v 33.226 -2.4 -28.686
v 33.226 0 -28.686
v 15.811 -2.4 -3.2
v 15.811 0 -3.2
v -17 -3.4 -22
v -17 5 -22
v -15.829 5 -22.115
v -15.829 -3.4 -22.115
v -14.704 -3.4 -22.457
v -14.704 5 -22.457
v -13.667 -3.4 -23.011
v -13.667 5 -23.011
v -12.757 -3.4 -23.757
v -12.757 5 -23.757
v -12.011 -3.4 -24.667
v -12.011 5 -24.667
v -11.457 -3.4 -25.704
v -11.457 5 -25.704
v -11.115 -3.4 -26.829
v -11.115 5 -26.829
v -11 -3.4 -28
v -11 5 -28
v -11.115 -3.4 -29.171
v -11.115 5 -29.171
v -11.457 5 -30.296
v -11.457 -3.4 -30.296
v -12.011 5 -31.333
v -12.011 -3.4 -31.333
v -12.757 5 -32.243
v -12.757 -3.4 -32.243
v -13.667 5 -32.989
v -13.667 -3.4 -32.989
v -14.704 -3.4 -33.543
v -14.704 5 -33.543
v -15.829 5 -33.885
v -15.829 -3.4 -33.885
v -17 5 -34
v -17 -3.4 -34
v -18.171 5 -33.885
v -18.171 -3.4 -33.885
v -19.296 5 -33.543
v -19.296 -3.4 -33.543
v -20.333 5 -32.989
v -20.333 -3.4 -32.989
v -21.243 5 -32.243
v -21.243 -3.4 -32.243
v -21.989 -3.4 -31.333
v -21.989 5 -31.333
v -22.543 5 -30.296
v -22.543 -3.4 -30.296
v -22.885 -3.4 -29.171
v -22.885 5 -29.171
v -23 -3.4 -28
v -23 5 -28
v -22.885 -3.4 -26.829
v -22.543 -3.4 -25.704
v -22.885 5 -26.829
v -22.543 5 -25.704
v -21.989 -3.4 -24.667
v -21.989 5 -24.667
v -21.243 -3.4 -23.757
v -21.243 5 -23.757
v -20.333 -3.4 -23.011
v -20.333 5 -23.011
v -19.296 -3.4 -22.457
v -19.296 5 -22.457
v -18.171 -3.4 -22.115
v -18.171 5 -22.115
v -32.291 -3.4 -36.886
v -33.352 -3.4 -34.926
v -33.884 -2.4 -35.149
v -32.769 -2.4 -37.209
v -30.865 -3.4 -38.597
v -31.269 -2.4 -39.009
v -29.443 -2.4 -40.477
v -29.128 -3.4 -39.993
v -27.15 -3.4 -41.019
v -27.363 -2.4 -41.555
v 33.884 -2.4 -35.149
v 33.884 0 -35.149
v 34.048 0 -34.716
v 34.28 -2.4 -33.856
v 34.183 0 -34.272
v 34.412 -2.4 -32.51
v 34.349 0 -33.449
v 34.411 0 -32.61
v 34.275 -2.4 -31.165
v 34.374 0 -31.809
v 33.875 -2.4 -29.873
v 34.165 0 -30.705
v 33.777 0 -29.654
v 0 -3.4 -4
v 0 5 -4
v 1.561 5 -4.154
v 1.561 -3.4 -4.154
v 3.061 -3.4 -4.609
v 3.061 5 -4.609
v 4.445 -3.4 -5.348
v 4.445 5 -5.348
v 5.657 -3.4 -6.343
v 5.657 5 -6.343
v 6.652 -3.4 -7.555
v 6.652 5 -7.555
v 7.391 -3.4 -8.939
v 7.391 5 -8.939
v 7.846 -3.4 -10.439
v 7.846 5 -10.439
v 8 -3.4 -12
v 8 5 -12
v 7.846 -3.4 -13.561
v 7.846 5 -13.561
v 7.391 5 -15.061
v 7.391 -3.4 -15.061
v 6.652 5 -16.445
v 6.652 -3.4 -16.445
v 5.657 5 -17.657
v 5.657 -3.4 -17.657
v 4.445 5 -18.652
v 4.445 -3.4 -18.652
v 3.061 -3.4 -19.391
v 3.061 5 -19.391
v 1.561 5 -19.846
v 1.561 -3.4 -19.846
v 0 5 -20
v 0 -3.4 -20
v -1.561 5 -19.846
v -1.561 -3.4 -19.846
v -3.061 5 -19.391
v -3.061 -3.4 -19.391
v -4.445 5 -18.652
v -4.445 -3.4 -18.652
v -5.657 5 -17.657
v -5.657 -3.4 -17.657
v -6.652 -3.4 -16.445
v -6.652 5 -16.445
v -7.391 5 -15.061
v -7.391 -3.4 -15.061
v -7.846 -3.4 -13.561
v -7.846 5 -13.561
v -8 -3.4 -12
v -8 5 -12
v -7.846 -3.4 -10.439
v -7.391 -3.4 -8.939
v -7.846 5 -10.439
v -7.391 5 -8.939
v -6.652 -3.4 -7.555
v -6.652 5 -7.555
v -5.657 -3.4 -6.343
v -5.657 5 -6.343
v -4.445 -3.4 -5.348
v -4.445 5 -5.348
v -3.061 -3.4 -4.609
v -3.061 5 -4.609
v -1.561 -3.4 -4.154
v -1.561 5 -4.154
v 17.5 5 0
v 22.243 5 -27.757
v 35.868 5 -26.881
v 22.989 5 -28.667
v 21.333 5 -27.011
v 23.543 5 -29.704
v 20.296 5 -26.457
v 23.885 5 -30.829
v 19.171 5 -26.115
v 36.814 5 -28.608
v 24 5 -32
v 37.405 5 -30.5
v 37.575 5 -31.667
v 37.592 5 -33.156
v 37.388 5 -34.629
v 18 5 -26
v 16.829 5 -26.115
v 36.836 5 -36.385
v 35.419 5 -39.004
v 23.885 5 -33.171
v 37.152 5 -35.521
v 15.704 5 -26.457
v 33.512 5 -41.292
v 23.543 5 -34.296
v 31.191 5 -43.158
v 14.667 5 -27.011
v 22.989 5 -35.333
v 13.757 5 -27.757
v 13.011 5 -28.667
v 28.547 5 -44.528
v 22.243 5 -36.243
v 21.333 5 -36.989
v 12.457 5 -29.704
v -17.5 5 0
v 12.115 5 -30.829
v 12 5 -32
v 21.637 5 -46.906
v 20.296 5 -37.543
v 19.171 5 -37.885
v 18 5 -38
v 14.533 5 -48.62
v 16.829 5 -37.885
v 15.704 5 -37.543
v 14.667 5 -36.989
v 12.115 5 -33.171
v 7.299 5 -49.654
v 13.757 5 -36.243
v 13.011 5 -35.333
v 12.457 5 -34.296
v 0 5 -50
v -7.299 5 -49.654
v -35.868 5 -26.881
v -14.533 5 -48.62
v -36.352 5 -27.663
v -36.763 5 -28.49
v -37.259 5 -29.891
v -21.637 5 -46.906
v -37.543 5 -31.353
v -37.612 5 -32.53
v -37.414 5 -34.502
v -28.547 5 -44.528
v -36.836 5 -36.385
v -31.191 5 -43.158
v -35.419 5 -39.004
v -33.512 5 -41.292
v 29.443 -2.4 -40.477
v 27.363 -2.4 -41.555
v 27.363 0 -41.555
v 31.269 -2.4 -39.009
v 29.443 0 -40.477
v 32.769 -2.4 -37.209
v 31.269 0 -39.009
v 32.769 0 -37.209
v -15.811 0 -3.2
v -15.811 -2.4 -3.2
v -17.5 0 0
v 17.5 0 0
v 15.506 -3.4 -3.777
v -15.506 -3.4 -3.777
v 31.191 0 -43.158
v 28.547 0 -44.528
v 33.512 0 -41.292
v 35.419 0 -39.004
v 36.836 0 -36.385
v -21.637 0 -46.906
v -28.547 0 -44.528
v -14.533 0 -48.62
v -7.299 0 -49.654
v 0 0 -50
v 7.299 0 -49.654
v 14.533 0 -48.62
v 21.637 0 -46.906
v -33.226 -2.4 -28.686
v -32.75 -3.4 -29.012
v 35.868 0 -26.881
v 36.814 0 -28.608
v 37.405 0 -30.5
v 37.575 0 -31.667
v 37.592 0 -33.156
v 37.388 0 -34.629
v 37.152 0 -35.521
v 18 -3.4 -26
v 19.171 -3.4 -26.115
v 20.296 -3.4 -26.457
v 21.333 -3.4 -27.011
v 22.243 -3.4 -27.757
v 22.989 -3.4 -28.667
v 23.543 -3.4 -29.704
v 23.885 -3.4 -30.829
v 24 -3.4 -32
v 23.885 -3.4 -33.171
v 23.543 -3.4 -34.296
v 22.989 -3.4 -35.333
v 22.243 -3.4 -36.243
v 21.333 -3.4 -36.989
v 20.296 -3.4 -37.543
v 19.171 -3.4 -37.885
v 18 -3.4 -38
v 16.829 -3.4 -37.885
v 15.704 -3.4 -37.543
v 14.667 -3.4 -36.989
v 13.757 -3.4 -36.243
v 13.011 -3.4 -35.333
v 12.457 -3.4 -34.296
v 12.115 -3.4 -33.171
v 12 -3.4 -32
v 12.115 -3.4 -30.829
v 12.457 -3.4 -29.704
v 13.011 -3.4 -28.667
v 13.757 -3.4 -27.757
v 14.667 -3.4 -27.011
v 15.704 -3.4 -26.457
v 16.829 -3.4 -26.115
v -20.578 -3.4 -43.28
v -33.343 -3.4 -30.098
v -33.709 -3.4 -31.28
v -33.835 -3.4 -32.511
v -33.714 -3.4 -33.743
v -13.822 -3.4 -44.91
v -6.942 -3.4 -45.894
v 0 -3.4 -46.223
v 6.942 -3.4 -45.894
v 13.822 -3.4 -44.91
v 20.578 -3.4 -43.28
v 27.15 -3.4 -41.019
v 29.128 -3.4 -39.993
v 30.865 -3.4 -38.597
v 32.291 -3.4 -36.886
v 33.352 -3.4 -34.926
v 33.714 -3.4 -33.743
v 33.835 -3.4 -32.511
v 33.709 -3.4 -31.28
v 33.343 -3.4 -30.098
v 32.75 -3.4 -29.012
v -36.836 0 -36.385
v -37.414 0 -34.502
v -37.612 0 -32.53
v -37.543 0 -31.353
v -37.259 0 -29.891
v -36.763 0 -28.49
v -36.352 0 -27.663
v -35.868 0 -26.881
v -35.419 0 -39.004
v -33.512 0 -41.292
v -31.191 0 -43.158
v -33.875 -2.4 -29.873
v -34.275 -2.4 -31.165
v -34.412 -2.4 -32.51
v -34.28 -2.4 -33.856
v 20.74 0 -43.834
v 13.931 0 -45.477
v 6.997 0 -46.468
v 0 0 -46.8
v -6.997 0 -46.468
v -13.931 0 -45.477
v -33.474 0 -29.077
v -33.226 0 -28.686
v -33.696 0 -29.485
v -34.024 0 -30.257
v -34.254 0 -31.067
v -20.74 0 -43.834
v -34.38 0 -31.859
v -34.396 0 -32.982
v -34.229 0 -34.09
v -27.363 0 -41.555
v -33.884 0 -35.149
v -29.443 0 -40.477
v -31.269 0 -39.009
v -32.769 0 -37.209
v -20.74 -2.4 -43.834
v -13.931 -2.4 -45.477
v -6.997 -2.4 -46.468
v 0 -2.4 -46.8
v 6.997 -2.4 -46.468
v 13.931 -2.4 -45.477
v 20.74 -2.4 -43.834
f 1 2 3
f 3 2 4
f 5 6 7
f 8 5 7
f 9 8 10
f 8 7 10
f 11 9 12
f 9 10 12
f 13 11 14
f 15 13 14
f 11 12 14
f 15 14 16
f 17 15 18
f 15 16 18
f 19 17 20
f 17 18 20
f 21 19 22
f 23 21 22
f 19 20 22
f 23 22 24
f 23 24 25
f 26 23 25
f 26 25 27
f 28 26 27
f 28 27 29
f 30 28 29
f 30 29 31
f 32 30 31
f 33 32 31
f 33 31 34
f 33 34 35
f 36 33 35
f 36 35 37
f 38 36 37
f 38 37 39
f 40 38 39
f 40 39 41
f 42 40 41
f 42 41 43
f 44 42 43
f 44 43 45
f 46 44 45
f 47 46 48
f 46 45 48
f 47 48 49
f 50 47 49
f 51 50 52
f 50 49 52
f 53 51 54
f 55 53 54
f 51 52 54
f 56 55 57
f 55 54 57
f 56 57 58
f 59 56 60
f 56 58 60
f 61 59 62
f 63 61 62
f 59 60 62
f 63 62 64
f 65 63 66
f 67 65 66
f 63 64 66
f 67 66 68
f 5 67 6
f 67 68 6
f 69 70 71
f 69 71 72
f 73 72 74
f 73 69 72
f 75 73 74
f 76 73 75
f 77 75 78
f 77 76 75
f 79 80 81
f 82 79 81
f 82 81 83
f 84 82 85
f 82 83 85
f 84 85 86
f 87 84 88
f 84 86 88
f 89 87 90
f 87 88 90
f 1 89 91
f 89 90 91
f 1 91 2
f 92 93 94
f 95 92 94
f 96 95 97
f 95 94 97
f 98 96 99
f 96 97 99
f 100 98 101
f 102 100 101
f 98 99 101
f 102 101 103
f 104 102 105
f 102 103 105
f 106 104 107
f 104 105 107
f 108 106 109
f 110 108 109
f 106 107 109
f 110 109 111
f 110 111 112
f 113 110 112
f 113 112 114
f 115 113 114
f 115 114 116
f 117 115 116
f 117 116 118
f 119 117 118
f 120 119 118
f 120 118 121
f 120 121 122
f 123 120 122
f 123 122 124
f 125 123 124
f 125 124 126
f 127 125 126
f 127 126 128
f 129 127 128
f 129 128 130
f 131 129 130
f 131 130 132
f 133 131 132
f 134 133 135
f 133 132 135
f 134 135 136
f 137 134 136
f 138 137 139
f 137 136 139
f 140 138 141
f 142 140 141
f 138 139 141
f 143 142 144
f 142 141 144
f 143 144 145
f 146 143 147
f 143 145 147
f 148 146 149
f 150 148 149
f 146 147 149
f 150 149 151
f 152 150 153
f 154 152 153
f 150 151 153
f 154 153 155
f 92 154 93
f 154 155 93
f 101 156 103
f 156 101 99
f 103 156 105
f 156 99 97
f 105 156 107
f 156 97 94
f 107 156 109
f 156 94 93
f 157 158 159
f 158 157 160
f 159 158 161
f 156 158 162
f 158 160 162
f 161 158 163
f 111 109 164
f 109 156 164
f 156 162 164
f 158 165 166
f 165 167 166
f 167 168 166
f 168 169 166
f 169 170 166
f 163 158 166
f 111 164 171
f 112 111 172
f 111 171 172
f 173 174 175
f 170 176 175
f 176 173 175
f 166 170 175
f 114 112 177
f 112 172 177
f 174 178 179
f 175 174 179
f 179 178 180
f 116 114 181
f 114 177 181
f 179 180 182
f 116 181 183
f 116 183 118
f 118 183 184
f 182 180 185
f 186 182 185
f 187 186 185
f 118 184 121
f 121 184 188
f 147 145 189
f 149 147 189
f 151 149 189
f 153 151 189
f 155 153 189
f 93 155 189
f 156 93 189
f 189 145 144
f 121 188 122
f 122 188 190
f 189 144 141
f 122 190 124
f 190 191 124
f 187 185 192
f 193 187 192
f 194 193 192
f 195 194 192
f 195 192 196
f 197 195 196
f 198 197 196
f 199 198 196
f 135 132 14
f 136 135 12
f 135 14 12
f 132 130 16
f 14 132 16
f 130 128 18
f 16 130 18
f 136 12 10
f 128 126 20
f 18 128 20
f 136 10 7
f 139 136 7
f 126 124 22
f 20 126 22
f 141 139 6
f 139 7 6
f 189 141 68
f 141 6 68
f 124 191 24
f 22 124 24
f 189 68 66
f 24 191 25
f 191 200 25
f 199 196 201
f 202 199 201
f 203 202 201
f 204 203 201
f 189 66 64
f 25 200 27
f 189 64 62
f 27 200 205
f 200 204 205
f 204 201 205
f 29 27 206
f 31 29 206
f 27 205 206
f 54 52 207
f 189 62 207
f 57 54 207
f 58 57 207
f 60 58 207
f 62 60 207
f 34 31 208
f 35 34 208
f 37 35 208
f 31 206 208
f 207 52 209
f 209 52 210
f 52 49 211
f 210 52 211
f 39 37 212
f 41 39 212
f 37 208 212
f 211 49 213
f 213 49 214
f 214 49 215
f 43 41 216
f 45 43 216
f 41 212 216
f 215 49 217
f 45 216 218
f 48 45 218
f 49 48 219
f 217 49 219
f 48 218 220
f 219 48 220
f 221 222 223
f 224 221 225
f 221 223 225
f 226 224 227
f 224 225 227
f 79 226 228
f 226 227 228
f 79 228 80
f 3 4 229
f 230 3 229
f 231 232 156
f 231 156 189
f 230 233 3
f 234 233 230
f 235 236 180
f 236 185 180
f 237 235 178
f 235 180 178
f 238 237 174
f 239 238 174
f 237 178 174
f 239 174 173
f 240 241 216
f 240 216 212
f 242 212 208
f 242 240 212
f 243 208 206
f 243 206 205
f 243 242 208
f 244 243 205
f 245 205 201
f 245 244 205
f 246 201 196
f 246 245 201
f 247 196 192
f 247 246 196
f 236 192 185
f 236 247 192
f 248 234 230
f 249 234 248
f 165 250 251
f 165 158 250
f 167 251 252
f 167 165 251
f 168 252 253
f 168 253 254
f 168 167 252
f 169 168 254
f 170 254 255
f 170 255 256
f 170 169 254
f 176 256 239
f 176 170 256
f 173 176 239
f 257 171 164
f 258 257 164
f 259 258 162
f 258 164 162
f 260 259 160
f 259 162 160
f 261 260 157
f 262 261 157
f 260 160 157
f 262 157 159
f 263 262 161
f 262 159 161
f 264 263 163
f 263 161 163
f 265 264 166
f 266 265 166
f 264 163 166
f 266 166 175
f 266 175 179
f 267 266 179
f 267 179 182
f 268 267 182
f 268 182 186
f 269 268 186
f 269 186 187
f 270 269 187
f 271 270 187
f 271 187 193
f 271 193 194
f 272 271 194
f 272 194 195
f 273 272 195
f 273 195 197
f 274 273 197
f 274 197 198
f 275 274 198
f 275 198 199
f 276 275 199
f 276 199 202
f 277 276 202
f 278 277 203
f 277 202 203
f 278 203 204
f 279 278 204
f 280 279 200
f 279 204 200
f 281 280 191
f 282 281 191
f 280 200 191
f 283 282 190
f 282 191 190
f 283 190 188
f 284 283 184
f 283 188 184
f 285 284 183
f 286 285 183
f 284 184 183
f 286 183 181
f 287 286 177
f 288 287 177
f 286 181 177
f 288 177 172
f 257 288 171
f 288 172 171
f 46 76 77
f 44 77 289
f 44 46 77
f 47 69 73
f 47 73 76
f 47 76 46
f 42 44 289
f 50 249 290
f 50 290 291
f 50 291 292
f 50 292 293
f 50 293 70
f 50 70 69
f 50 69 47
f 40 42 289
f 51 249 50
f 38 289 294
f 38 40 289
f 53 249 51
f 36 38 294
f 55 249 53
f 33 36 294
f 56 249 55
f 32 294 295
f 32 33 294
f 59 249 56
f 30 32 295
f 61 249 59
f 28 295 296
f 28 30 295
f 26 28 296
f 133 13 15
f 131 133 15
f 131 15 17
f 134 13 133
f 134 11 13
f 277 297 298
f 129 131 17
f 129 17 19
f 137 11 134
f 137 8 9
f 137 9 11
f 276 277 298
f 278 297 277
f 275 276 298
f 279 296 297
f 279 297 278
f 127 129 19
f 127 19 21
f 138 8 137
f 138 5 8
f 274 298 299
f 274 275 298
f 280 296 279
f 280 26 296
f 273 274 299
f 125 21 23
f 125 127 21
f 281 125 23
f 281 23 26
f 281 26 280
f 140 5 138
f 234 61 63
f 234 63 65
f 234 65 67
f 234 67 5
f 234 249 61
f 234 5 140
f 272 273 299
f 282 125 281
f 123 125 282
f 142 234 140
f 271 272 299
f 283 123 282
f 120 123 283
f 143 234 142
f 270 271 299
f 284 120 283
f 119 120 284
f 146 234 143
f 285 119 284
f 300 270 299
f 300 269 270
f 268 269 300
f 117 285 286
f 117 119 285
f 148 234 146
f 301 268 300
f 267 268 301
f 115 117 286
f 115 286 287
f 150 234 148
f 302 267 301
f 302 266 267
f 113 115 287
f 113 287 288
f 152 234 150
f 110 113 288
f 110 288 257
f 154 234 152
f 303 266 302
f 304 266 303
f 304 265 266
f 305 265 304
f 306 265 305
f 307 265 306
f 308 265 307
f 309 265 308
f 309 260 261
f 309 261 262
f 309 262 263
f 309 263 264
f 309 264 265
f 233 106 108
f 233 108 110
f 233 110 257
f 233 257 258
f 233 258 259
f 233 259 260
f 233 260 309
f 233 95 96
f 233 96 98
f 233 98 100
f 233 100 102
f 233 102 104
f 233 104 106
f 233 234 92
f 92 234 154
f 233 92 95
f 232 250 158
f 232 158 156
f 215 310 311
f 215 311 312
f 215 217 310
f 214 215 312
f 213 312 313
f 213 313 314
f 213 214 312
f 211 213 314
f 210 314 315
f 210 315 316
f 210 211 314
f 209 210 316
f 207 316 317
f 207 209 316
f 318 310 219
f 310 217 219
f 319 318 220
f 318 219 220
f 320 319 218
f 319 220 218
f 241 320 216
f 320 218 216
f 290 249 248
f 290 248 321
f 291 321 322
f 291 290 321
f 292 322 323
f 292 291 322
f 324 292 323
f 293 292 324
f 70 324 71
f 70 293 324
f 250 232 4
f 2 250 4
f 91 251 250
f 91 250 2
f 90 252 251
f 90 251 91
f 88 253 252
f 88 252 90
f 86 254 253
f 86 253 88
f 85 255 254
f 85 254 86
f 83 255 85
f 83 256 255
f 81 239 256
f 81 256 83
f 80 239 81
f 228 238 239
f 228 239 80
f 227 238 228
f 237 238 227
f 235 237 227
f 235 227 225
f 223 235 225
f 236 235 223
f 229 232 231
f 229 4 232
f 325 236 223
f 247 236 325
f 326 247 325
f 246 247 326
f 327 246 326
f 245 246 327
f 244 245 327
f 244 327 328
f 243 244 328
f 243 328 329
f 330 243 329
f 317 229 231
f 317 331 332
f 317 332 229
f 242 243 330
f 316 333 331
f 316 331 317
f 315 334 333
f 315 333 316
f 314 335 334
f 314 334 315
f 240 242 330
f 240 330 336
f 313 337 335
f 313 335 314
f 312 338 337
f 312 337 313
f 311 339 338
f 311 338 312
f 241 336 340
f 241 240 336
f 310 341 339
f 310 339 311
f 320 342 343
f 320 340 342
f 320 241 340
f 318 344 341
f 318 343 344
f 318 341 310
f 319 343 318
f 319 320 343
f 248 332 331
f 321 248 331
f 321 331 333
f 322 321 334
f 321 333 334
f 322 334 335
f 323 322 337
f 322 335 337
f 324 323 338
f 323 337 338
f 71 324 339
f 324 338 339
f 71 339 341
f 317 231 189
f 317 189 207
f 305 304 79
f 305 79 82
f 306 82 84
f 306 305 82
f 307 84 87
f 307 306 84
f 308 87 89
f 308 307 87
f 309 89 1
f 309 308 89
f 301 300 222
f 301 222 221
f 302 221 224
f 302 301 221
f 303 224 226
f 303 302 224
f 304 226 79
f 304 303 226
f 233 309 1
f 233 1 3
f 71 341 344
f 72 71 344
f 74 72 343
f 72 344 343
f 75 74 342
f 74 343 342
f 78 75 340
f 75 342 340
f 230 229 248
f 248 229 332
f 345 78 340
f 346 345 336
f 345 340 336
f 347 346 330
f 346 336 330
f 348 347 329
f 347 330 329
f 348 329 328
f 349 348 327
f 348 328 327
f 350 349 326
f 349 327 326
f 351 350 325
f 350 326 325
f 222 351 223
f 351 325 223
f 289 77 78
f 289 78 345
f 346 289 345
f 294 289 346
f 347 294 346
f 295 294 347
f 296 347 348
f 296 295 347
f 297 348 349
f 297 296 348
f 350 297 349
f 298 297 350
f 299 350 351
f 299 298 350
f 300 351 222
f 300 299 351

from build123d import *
from OCP.BRepFilletAPI import BRepFilletAPI_MakeChamfer

# Parameters (mm, degrees)
BOSS_EXTRUDE1_DEPTH = 5
FILLET2_R           = 15
FILLET3_R           = 10
SHELL1_T            = -3.2
BOSS_EXTRUDE2_DEPTH = 5.2
CHAMFER1_SIZE       = 1
CHAMFER1_SIZE2      = 0.577350269
SKETCH2_R           = 8
CUT_EXTRUDE1_DEPTH  = 64.128614634
SKETCH3_R           = 6
CUT_EXTRUDE2_DEPTH  = 64.128614634


with BuildPart() as part:
    # Sketch1 → Boss-Extrude1 (new body)
    with BuildSketch(Plane(origin=(0, 0, 0), x_dir=(1, 0, 0), z_dir=(0, 1, 0))):
        with BuildLine():
            Line((17.5, 0), (-17.5, 0))
            Line((-17.5, 0), (-38, 30))
            Line((-38, 30), (-38, 40))
            ThreePointArc((-38, 40), (0, 50), (38, 40))
            Line((38, 40), (38, 30))
            Line((38, 30), (17.5, 0))
        make_face()
    extrude(amount=BOSS_EXTRUDE1_DEPTH)

    # Fillet2
    fillet2_edges = [part.edges().sort_by_distance(p)[0] for p in [
        (-38, 2.5, -40),
        (38, 2.5, -40),
    ]]
    fillet(fillet2_edges, radius=FILLET2_R)

    # Fillet3
    fillet3_edges = [part.edges().sort_by_distance(p)[0] for p in [
        (38, 2.5, -30),
        (-38, 2.5, -30),
    ]]
    fillet(fillet3_edges, radius=FILLET3_R)

    # Shell1
    shell1_openings = [part.faces().sort_by_distance(p)[0] for p in [
        (0, 0, -26.14204648),
    ]]
    offset(amount=SHELL1_T, openings=shell1_openings)

    # Sketch5 → Boss-Extrude2 (add)
    with BuildSketch(Plane.XZ.offset(-1.8)):
        with BuildLine():
            Line((15.810907243, -3.2), (-15.810907243, -3.2))
            Line((-15.810907243, -3.2), (-33.226375888, -28.686051676))
            ThreePointArc((-33.226375888, -28.686051676), (-34.377028804, -31.833866159), (-33.88430189, -35.148976767))
            ThreePointArc((-33.88430189, -35.148976767), (-31.269334859, -39.009074238), (-27.363344051, -41.554980927))
            ThreePointArc((-27.363344051, -41.554980927), (0, -46.8), (27.363344051, -41.554980927))
            ThreePointArc((27.363344051, -41.554980927), (31.269334859, -39.009074238), (33.88430189, -35.148976767))
            ThreePointArc((33.88430189, -35.148976767), (34.377028804, -31.833866159), (33.226375888, -28.686051676))
            Line((33.226375888, -28.686051676), (15.810907243, -3.2))
        make_face()
    extrude(amount=BOSS_EXTRUDE2_DEPTH)

    # Chamfer1: one chamfer whose edges measure the first distance from different faces: ONE call of the kernel's chamfer builder (chamfer() names one face for all edges)
    chamfer1_edges_1 = [part.edges().sort_by_distance(p)[0] for p in [
        (24.518641566, -3.4, -15.943025838),
    ]]
    chamfer1_side_1 = [part.faces().sort_by_distance(p)[0] for p in [
        (24.518641566, -1.7, -15.943025838),
    ]]
    chamfer1_edges_2 = [part.edges().sort_by_distance(p)[0] for p in [
        (0, -3.4, -3.2),
    ]]
    chamfer1_side_2 = [part.faces().sort_by_distance(p)[0] for p in [
        (0, -1.7, -3.2),
    ]]
    chamfer1_edges_3 = [part.edges().sort_by_distance(p)[0] for p in [
        (-24.518641566, -3.4, -15.943025838),
    ]]
    chamfer1_side_3 = [part.faces().sort_by_distance(p)[0] for p in [
        (-24.518641566, -1.7, -15.943025838),
    ]]
    chamfer1_edges_4 = [part.edges().sort_by_distance(p)[0] for p in [
        (-34.377028804, -3.4, -31.833866159),
    ]]
    chamfer1_side_4 = [part.faces().sort_by_distance(p)[0] for p in [
        (-34.377028804, -1.7, -31.833866159),
    ]]
    chamfer1_edges_5 = [part.edges().sort_by_distance(p)[0] for p in [
        (-31.269334859, -3.4, -39.009074238),
    ]]
    chamfer1_side_5 = [part.faces().sort_by_distance(p)[0] for p in [
        (-31.269334859, -1.7, -39.009074238),
    ]]
    chamfer1_edges_6 = [part.edges().sort_by_distance(p)[0] for p in [
        (0, -3.4, -46.8),
    ]]
    chamfer1_side_6 = [part.faces().sort_by_distance(p)[0] for p in [
        (0, -1.7, -46.8),
    ]]
    chamfer1_edges_7 = [part.edges().sort_by_distance(p)[0] for p in [
        (31.269334859, -3.4, -39.009074238),
    ]]
    chamfer1_side_7 = [part.faces().sort_by_distance(p)[0] for p in [
        (31.269334859, -1.7, -39.009074238),
    ]]
    chamfer1_edges_8 = [part.edges().sort_by_distance(p)[0] for p in [
        (34.377028804, -3.4, -31.833866159),
    ]]
    chamfer1_side_8 = [part.faces().sort_by_distance(p)[0] for p in [
        (34.377028804, -1.7, -31.833866159),
    ]]
    chamfer1 = BRepFilletAPI_MakeChamfer(part.part.solid().wrapped)
    for e in chamfer1_edges_1:
        chamfer1.Add(CHAMFER1_SIZE, CHAMFER1_SIZE2, e.wrapped, chamfer1_side_1[0].wrapped)  # the first distance lies on this face
    for e in chamfer1_edges_2:
        chamfer1.Add(CHAMFER1_SIZE, CHAMFER1_SIZE2, e.wrapped, chamfer1_side_2[0].wrapped)  # the first distance lies on this face
    for e in chamfer1_edges_3:
        chamfer1.Add(CHAMFER1_SIZE, CHAMFER1_SIZE2, e.wrapped, chamfer1_side_3[0].wrapped)  # the first distance lies on this face
    for e in chamfer1_edges_4:
        chamfer1.Add(CHAMFER1_SIZE, CHAMFER1_SIZE2, e.wrapped, chamfer1_side_4[0].wrapped)  # the first distance lies on this face
    for e in chamfer1_edges_5:
        chamfer1.Add(CHAMFER1_SIZE, CHAMFER1_SIZE2, e.wrapped, chamfer1_side_5[0].wrapped)  # the first distance lies on this face
    for e in chamfer1_edges_6:
        chamfer1.Add(CHAMFER1_SIZE, CHAMFER1_SIZE2, e.wrapped, chamfer1_side_6[0].wrapped)  # the first distance lies on this face
    for e in chamfer1_edges_7:
        chamfer1.Add(CHAMFER1_SIZE, CHAMFER1_SIZE2, e.wrapped, chamfer1_side_7[0].wrapped)  # the first distance lies on this face
    for e in chamfer1_edges_8:
        chamfer1.Add(CHAMFER1_SIZE, CHAMFER1_SIZE2, e.wrapped, chamfer1_side_8[0].wrapped)  # the first distance lies on this face
    add(Compound.cast(chamfer1.Shape()), mode=Mode.REPLACE)

    # Sketch2 → Cut-Extrude1 (cut, through all)
    with BuildSketch(Plane(origin=(0, 5, 0), x_dir=(1, 0, 0), z_dir=(0, 1, 0))):
        with Locations(Location((0, 12, 0), (0, 0, 270))):
            Circle(SKETCH2_R)
    extrude(amount=-CUT_EXTRUDE1_DEPTH, mode=Mode.SUBTRACT)

    # Sketch3 → Cut-Extrude2 (cut, through all)
    with BuildSketch(Plane(origin=(0, 5, 0), x_dir=(1, 0, 0), z_dir=(0, 1, 0))):
        with Locations(Location((-17, 28, 0), (0, 0, 270))):
            Circle(SKETCH3_R)
        with Locations(Location((18, 32, 0), (0, 0, 270))):
            Circle(SKETCH3_R)
    extrude(amount=-CUT_EXTRUDE2_DEPTH, mode=Mode.SUBTRACT)


solid = part.part
